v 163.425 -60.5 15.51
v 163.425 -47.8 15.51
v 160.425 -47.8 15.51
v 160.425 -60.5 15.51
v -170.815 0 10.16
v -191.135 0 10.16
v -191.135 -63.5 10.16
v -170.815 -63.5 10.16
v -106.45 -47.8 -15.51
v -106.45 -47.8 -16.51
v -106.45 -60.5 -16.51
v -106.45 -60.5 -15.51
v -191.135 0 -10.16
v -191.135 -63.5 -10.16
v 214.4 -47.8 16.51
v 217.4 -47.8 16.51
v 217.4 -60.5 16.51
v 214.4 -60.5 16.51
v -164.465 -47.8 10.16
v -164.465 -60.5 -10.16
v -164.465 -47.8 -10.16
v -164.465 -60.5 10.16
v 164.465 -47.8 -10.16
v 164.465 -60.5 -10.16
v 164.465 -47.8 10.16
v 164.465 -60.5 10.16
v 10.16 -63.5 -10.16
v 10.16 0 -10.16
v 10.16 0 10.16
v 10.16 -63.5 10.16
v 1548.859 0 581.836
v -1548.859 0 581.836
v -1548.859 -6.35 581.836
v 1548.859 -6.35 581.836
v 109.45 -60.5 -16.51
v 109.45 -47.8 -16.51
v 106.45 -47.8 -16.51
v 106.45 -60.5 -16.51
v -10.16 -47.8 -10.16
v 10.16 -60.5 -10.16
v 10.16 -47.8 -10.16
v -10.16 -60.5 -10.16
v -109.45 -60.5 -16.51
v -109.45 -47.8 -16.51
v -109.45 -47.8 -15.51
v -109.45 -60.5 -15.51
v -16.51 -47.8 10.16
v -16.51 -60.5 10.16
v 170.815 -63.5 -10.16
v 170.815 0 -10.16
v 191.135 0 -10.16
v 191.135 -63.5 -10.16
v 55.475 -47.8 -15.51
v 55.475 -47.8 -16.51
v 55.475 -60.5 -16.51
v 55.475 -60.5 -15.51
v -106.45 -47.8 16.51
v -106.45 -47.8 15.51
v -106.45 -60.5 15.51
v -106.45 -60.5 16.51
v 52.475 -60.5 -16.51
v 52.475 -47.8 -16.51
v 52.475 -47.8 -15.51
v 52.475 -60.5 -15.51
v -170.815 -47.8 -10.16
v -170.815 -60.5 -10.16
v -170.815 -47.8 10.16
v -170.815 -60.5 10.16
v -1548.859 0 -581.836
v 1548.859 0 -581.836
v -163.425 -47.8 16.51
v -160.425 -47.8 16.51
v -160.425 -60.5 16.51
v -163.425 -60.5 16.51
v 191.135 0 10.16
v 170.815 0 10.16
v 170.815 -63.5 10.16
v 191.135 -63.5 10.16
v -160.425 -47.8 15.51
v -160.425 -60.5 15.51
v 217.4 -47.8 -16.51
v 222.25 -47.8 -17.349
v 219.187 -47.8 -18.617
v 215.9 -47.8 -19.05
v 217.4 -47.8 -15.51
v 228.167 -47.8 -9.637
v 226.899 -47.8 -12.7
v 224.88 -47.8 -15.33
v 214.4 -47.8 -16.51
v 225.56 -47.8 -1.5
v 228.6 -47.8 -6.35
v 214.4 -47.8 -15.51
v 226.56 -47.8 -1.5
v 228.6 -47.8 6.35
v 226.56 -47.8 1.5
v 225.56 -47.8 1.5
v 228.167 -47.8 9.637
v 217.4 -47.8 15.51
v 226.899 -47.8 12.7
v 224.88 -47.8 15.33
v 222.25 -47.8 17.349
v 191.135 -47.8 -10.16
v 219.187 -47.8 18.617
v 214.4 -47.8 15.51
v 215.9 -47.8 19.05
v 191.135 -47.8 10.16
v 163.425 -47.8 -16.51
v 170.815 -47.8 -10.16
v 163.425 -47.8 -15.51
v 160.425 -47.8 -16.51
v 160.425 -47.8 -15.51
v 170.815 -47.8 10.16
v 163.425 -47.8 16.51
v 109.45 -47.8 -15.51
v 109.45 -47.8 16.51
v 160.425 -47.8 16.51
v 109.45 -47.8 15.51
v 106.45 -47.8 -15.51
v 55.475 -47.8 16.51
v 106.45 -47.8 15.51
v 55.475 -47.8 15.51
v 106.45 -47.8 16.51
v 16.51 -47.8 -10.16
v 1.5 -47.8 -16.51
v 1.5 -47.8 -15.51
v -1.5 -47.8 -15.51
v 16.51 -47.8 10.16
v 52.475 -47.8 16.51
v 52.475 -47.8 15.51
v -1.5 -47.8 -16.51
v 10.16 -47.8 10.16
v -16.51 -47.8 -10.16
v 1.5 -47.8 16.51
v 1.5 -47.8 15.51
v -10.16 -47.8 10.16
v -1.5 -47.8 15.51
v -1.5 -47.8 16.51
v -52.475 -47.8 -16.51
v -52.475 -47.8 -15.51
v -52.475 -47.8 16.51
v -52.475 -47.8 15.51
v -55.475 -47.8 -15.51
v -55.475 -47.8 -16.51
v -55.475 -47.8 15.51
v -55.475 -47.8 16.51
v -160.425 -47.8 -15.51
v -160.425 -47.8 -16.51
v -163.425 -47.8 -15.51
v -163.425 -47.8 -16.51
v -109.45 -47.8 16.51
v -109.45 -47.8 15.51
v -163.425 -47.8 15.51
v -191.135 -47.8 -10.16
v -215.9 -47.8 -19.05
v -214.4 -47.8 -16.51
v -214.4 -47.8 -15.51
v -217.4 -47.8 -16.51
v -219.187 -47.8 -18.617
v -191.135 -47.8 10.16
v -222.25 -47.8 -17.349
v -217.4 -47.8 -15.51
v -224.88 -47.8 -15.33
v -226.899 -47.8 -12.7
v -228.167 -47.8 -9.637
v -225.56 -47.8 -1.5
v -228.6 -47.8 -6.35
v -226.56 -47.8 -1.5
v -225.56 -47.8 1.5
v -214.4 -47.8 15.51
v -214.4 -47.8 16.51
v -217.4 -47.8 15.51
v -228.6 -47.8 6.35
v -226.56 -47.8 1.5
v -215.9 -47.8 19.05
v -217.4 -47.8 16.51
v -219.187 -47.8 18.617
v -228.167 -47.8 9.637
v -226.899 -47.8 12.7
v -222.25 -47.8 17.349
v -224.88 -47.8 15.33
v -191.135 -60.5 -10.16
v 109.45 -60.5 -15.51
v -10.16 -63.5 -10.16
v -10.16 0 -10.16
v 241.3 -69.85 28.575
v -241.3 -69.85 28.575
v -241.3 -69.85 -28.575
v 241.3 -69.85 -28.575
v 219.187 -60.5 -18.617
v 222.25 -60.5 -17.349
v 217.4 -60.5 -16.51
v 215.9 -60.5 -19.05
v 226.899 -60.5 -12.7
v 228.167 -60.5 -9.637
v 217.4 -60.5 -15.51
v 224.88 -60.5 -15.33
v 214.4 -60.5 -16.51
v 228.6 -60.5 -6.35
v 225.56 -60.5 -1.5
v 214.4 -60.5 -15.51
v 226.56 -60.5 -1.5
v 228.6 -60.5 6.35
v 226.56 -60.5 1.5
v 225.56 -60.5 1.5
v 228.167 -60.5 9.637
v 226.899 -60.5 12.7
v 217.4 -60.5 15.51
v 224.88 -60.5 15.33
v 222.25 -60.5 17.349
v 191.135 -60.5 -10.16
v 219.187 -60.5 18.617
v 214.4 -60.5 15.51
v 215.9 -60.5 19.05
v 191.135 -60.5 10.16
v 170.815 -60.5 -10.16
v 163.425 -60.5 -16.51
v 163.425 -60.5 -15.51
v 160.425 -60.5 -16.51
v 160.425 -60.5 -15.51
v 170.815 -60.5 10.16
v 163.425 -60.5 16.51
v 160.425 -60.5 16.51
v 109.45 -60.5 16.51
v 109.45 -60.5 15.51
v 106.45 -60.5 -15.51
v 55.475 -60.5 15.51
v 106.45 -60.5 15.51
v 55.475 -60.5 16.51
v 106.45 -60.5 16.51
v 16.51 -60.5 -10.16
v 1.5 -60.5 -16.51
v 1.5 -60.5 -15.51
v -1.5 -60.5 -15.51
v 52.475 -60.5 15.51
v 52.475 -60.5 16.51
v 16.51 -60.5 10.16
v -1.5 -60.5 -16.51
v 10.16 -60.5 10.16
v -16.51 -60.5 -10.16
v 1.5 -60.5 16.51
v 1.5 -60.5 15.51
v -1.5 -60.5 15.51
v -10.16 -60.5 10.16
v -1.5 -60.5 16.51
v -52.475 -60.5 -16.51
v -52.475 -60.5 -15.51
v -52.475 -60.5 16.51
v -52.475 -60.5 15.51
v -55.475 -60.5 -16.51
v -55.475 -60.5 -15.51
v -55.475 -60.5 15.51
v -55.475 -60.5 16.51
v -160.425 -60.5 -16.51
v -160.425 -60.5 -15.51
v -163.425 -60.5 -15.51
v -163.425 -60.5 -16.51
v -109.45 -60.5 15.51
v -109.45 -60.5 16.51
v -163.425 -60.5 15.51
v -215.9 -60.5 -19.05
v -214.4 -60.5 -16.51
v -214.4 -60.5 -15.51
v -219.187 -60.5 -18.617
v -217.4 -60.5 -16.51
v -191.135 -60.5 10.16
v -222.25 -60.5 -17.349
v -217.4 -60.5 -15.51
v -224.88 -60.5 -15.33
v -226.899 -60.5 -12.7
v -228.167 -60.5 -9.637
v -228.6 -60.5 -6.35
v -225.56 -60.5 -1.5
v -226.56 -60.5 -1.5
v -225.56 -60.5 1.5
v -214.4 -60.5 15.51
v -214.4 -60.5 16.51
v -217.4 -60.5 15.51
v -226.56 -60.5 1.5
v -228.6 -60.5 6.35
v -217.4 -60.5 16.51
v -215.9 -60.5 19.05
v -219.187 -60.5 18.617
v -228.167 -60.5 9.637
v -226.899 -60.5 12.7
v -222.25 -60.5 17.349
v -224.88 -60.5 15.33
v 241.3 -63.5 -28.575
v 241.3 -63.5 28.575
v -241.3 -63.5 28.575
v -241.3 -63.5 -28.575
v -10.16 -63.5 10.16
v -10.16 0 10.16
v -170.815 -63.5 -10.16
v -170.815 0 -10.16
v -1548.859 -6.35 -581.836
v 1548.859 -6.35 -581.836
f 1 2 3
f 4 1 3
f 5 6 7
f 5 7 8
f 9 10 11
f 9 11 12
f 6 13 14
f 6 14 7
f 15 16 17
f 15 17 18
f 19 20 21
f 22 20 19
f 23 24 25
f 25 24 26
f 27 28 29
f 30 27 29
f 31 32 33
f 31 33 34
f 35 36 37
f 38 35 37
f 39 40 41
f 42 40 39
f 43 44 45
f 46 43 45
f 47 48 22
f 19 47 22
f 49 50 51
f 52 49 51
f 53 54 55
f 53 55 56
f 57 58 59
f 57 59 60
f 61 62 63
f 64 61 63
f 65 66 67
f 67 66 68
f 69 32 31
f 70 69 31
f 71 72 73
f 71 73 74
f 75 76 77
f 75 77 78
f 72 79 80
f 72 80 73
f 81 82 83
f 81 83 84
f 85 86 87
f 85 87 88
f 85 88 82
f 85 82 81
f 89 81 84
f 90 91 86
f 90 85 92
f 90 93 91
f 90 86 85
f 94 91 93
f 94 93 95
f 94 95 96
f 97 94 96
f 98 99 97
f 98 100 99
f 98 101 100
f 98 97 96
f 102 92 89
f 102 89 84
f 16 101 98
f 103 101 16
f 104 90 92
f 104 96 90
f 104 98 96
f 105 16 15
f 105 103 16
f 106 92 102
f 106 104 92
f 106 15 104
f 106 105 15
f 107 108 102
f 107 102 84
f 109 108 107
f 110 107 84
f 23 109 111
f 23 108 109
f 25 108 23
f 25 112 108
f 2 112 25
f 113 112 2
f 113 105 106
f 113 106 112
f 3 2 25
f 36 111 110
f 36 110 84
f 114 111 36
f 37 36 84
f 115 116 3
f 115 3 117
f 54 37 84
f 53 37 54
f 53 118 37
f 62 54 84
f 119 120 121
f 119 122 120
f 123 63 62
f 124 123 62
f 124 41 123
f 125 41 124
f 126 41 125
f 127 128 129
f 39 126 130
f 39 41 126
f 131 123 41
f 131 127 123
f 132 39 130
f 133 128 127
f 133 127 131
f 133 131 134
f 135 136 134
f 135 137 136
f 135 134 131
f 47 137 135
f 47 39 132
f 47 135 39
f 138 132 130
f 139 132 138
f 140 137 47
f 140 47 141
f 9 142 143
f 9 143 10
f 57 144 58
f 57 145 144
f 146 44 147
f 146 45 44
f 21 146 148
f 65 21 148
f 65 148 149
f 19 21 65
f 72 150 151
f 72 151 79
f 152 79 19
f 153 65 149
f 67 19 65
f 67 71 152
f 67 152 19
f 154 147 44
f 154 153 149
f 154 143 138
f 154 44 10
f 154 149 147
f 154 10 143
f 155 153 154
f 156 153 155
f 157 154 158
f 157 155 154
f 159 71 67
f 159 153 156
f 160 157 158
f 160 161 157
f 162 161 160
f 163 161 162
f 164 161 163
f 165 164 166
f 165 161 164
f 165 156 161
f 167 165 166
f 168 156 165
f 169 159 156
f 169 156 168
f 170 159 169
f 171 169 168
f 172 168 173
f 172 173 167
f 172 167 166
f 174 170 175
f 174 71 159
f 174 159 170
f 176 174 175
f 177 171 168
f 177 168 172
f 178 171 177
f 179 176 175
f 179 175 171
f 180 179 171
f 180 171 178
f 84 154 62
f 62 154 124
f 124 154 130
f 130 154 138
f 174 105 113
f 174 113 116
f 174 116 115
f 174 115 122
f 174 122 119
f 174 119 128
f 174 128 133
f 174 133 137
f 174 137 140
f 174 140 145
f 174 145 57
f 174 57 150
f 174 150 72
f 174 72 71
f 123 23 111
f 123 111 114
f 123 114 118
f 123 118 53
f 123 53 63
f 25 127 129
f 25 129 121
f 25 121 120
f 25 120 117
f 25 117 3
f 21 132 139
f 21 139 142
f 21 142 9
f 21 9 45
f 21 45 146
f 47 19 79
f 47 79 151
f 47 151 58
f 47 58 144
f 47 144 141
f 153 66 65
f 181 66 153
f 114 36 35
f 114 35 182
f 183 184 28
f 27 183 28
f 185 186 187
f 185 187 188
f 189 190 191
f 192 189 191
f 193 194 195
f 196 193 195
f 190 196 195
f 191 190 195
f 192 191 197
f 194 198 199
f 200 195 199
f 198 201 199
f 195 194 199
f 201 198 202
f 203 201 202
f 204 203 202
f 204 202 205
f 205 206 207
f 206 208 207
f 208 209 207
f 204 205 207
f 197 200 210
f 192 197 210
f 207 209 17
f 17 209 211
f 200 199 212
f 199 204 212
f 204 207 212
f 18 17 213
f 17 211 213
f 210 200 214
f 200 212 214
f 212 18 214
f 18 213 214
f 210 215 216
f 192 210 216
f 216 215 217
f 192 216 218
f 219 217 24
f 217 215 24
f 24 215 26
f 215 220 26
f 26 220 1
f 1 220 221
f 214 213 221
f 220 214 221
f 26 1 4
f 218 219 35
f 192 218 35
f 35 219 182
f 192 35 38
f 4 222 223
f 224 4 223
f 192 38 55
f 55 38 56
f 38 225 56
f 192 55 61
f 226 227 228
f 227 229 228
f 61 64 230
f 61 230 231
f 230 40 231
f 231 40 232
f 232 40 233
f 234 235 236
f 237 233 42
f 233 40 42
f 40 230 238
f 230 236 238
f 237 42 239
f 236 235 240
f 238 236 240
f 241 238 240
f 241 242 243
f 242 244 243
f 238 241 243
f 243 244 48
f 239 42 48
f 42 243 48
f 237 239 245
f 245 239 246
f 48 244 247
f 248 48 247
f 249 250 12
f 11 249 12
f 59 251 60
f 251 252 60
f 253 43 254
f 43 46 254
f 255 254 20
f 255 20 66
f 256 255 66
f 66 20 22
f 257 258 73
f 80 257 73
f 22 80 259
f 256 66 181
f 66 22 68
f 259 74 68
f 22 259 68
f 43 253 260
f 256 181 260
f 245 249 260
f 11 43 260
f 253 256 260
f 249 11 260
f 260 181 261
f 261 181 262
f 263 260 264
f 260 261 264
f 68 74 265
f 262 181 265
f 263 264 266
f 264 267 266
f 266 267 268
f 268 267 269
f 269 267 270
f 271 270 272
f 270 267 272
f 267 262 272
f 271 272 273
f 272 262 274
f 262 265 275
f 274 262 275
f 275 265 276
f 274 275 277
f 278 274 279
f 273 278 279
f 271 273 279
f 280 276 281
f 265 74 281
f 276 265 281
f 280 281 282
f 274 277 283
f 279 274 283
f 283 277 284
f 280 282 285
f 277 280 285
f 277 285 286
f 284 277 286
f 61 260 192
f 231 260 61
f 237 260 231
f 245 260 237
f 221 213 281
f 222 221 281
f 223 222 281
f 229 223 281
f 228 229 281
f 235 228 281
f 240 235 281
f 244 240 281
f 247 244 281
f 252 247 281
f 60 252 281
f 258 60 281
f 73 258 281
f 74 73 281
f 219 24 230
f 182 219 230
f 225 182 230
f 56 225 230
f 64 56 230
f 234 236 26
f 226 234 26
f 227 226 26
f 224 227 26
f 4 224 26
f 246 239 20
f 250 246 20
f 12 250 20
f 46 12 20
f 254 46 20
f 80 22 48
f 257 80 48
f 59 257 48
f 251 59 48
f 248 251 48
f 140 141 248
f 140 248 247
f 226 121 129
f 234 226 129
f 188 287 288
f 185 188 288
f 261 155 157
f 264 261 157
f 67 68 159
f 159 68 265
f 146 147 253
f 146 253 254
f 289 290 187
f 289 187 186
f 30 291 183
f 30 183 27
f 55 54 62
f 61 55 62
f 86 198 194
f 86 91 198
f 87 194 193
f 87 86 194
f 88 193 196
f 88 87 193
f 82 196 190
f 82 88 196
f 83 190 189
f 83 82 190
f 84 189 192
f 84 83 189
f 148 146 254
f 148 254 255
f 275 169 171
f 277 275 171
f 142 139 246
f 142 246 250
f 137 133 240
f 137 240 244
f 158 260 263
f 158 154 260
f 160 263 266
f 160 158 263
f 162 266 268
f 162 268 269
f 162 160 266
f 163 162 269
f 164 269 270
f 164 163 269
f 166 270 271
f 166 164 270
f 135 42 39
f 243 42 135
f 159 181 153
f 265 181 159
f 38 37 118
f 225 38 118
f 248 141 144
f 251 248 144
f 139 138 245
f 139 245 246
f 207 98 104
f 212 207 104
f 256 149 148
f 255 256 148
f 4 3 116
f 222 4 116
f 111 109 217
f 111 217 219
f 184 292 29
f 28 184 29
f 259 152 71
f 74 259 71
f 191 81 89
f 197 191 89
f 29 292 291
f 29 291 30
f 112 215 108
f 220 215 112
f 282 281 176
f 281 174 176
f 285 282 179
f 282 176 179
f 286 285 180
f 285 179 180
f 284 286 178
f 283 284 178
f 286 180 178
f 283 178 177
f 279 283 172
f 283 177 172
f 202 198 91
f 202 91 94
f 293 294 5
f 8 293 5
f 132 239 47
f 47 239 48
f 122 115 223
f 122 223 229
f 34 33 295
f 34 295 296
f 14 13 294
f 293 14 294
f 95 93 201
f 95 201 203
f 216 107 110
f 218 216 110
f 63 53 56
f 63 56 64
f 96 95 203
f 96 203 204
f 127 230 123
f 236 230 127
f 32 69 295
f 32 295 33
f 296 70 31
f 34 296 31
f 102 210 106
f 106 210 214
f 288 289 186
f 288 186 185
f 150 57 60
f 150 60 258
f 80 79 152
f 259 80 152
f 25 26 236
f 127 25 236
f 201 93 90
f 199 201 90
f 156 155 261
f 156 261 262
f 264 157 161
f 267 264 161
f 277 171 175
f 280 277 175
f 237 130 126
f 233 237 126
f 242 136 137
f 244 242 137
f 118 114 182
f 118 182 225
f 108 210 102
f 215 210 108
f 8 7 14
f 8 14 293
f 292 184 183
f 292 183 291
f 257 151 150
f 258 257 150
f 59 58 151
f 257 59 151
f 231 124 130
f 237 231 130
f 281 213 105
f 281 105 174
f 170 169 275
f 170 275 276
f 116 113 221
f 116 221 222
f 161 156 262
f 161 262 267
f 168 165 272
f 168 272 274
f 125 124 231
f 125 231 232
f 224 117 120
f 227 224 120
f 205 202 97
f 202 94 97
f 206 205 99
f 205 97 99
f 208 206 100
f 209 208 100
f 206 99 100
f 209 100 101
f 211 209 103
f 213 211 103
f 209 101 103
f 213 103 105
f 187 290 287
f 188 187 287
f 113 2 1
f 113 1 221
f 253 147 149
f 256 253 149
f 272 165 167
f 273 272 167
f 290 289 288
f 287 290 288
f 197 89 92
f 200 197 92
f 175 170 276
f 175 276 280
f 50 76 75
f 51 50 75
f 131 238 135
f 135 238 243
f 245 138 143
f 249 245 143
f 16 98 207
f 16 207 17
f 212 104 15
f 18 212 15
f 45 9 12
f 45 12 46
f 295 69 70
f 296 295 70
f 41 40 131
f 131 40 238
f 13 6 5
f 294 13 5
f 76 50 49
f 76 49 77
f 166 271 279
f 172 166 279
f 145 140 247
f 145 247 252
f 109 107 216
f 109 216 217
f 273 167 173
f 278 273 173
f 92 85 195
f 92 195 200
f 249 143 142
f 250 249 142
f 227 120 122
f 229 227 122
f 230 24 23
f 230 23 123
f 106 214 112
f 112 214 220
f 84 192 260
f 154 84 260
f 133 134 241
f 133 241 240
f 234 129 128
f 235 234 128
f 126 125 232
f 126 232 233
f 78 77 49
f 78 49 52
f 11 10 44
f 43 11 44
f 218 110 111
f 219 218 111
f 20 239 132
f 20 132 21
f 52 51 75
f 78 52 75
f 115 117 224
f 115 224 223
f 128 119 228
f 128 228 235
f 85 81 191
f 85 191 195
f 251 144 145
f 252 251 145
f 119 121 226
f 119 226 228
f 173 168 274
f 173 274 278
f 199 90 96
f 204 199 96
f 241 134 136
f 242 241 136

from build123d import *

# Parameters (mm, degrees)
F0_W     = 20.32
F0_H     = 20.32
F1_DEPTH = 63.5
F2_W     = 482.6
F2_H     = 57.15
F3_DEPTH = 6.35
F5_W     = 457.2
F5_H     = 38.1
F5_W_2   = 3
F5_H_2   = 1
F5_W_3   = 1
F5_H_3   = 3
F5_W_4   = 20.32
F5_H_4   = 20.32
F5_W_5   = 147.955
F6_DEPTH = 12.7
F7_R     = 12.7
F8_W     = 3097.7175235748
F8_H     = 1163.6712551117
F9_DEPTH = 6.35


with BuildPart() as f1:
    # F0 (on Front) → F1 (new body)
    with BuildSketch(Plane.XZ):
        Rectangle(F0_W, F0_H)
    extrude(amount=F1_DEPTH)


with BuildPart() as f1b:
    # F0 (on Front) → F1, piece 2 (new body)
    with BuildSketch(Plane.XZ):
        with Locations((180.975, 0)):
            Rectangle(F0_W, F0_H)
    extrude(amount=F1_DEPTH)


with BuildPart() as f1c:
    # F0 (on Front) → F1, piece 3 (new body)
    with BuildSketch(Plane.XZ):
        with Locations((-180.975, 0)):
            Rectangle(F0_W, F0_H)
    extrude(amount=F1_DEPTH)


with BuildPart() as f3:
    # F2 (on face) → F3 (new body)
    with BuildSketch(Plane.XZ.offset(63.5)):
        Rectangle(F2_W, F2_H)
    extrude(amount=F3_DEPTH)


with BuildPart() as f6:
    # F5 (on offset) → F6 (new body)
    with BuildSketch(Plane(origin=(0, -60.5, 0), x_dir=(-1, 0, 0), z_dir=(0, 1, 0))):
        Rectangle(F5_W, F5_H)
        with Locations((-215.9, -16.01)):
            Rectangle(F5_W_2, F5_H_2, mode=Mode.SUBTRACT)
        with Locations((-161.925, -16.01)):
            Rectangle(F5_W_2, F5_H_2, mode=Mode.SUBTRACT)
        with Locations((-107.95, -16.01)):
            Rectangle(F5_W_2, F5_H_2, mode=Mode.SUBTRACT)
        with Locations((-53.975, -16.01)):
            Rectangle(F5_W_2, F5_H_2, mode=Mode.SUBTRACT)
        with Locations((0, -16.01)):
            Rectangle(F5_W_2, F5_H_2, mode=Mode.SUBTRACT)
        with Locations((53.975, -16.01)):
            Rectangle(F5_W_2, F5_H_2, mode=Mode.SUBTRACT)
        with Locations((107.95, -16.01)):
            Rectangle(F5_W_2, F5_H_2, mode=Mode.SUBTRACT)
        with Locations((161.925, -16.01)):
            Rectangle(F5_W_2, F5_H_2, mode=Mode.SUBTRACT)
        with Locations((215.9, -16.01)):
            Rectangle(F5_W_2, F5_H_2, mode=Mode.SUBTRACT)
        with Locations((-226.06, 0)):
            Rectangle(F5_W_3, F5_H_3, mode=Mode.SUBTRACT)
        with Locations((-180.975, 0)):
            Rectangle(F5_W_4, F5_H_4, mode=Mode.SUBTRACT)
        with Locations((-90.4875, 0)):
            Rectangle(F5_W_5, F5_H_4, mode=Mode.SUBTRACT)
        with Locations((-215.9, 16.01)):
            Rectangle(F5_W_2, F5_H_2, mode=Mode.SUBTRACT)
        with Locations((-161.925, 16.01)):
            Rectangle(F5_W_2, F5_H_2, mode=Mode.SUBTRACT)
        with Locations((-107.95, 16.01)):
            Rectangle(F5_W_2, F5_H_2, mode=Mode.SUBTRACT)
        with Locations((-53.975, 16.01)):
            Rectangle(F5_W_2, F5_H_2, mode=Mode.SUBTRACT)
        Rectangle(F5_W_4, F5_H_4, mode=Mode.SUBTRACT)
        with Locations((90.4875, 0)):
            Rectangle(F5_W_5, F5_H_4, mode=Mode.SUBTRACT)
        with Locations((180.975, 0)):
            Rectangle(F5_W_4, F5_H_4, mode=Mode.SUBTRACT)
        with Locations((226.06, 0)):
            Rectangle(F5_W_3, F5_H_3, mode=Mode.SUBTRACT)
        with Locations((0, 16.01)):
            Rectangle(F5_W_2, F5_H_2, mode=Mode.SUBTRACT)
        with Locations((53.975, 16.01)):
            Rectangle(F5_W_2, F5_H_2, mode=Mode.SUBTRACT)
        with Locations((107.95, 16.01)):
            Rectangle(F5_W_2, F5_H_2, mode=Mode.SUBTRACT)
        with Locations((161.925, 16.01)):
            Rectangle(F5_W_2, F5_H_2, mode=Mode.SUBTRACT)
        with Locations((215.9, 16.01)):
            Rectangle(F5_W_2, F5_H_2, mode=Mode.SUBTRACT)
    extrude(amount=F6_DEPTH)

    # F7
    f7_edges = [f6.edges().sort_by_distance(p)[0] for p in [
        (228.6, -54.15, 19.05),
        (228.6, -54.15, -19.05),
        (-228.6, -54.15, 19.05),
        (-228.6, -54.15, -19.05),
    ]]
    fillet(f7_edges, radius=F7_R)


with BuildPart() as f9:
    # F8 (on Front) → F9 (new body)
    with BuildSketch(Plane.XZ):
        Rectangle(F8_W, F8_H)
    extrude(amount=F9_DEPTH)


solid = Compound([f1.part, f1b.part, f1c.part, f3.part, f6.part, f9.part])
